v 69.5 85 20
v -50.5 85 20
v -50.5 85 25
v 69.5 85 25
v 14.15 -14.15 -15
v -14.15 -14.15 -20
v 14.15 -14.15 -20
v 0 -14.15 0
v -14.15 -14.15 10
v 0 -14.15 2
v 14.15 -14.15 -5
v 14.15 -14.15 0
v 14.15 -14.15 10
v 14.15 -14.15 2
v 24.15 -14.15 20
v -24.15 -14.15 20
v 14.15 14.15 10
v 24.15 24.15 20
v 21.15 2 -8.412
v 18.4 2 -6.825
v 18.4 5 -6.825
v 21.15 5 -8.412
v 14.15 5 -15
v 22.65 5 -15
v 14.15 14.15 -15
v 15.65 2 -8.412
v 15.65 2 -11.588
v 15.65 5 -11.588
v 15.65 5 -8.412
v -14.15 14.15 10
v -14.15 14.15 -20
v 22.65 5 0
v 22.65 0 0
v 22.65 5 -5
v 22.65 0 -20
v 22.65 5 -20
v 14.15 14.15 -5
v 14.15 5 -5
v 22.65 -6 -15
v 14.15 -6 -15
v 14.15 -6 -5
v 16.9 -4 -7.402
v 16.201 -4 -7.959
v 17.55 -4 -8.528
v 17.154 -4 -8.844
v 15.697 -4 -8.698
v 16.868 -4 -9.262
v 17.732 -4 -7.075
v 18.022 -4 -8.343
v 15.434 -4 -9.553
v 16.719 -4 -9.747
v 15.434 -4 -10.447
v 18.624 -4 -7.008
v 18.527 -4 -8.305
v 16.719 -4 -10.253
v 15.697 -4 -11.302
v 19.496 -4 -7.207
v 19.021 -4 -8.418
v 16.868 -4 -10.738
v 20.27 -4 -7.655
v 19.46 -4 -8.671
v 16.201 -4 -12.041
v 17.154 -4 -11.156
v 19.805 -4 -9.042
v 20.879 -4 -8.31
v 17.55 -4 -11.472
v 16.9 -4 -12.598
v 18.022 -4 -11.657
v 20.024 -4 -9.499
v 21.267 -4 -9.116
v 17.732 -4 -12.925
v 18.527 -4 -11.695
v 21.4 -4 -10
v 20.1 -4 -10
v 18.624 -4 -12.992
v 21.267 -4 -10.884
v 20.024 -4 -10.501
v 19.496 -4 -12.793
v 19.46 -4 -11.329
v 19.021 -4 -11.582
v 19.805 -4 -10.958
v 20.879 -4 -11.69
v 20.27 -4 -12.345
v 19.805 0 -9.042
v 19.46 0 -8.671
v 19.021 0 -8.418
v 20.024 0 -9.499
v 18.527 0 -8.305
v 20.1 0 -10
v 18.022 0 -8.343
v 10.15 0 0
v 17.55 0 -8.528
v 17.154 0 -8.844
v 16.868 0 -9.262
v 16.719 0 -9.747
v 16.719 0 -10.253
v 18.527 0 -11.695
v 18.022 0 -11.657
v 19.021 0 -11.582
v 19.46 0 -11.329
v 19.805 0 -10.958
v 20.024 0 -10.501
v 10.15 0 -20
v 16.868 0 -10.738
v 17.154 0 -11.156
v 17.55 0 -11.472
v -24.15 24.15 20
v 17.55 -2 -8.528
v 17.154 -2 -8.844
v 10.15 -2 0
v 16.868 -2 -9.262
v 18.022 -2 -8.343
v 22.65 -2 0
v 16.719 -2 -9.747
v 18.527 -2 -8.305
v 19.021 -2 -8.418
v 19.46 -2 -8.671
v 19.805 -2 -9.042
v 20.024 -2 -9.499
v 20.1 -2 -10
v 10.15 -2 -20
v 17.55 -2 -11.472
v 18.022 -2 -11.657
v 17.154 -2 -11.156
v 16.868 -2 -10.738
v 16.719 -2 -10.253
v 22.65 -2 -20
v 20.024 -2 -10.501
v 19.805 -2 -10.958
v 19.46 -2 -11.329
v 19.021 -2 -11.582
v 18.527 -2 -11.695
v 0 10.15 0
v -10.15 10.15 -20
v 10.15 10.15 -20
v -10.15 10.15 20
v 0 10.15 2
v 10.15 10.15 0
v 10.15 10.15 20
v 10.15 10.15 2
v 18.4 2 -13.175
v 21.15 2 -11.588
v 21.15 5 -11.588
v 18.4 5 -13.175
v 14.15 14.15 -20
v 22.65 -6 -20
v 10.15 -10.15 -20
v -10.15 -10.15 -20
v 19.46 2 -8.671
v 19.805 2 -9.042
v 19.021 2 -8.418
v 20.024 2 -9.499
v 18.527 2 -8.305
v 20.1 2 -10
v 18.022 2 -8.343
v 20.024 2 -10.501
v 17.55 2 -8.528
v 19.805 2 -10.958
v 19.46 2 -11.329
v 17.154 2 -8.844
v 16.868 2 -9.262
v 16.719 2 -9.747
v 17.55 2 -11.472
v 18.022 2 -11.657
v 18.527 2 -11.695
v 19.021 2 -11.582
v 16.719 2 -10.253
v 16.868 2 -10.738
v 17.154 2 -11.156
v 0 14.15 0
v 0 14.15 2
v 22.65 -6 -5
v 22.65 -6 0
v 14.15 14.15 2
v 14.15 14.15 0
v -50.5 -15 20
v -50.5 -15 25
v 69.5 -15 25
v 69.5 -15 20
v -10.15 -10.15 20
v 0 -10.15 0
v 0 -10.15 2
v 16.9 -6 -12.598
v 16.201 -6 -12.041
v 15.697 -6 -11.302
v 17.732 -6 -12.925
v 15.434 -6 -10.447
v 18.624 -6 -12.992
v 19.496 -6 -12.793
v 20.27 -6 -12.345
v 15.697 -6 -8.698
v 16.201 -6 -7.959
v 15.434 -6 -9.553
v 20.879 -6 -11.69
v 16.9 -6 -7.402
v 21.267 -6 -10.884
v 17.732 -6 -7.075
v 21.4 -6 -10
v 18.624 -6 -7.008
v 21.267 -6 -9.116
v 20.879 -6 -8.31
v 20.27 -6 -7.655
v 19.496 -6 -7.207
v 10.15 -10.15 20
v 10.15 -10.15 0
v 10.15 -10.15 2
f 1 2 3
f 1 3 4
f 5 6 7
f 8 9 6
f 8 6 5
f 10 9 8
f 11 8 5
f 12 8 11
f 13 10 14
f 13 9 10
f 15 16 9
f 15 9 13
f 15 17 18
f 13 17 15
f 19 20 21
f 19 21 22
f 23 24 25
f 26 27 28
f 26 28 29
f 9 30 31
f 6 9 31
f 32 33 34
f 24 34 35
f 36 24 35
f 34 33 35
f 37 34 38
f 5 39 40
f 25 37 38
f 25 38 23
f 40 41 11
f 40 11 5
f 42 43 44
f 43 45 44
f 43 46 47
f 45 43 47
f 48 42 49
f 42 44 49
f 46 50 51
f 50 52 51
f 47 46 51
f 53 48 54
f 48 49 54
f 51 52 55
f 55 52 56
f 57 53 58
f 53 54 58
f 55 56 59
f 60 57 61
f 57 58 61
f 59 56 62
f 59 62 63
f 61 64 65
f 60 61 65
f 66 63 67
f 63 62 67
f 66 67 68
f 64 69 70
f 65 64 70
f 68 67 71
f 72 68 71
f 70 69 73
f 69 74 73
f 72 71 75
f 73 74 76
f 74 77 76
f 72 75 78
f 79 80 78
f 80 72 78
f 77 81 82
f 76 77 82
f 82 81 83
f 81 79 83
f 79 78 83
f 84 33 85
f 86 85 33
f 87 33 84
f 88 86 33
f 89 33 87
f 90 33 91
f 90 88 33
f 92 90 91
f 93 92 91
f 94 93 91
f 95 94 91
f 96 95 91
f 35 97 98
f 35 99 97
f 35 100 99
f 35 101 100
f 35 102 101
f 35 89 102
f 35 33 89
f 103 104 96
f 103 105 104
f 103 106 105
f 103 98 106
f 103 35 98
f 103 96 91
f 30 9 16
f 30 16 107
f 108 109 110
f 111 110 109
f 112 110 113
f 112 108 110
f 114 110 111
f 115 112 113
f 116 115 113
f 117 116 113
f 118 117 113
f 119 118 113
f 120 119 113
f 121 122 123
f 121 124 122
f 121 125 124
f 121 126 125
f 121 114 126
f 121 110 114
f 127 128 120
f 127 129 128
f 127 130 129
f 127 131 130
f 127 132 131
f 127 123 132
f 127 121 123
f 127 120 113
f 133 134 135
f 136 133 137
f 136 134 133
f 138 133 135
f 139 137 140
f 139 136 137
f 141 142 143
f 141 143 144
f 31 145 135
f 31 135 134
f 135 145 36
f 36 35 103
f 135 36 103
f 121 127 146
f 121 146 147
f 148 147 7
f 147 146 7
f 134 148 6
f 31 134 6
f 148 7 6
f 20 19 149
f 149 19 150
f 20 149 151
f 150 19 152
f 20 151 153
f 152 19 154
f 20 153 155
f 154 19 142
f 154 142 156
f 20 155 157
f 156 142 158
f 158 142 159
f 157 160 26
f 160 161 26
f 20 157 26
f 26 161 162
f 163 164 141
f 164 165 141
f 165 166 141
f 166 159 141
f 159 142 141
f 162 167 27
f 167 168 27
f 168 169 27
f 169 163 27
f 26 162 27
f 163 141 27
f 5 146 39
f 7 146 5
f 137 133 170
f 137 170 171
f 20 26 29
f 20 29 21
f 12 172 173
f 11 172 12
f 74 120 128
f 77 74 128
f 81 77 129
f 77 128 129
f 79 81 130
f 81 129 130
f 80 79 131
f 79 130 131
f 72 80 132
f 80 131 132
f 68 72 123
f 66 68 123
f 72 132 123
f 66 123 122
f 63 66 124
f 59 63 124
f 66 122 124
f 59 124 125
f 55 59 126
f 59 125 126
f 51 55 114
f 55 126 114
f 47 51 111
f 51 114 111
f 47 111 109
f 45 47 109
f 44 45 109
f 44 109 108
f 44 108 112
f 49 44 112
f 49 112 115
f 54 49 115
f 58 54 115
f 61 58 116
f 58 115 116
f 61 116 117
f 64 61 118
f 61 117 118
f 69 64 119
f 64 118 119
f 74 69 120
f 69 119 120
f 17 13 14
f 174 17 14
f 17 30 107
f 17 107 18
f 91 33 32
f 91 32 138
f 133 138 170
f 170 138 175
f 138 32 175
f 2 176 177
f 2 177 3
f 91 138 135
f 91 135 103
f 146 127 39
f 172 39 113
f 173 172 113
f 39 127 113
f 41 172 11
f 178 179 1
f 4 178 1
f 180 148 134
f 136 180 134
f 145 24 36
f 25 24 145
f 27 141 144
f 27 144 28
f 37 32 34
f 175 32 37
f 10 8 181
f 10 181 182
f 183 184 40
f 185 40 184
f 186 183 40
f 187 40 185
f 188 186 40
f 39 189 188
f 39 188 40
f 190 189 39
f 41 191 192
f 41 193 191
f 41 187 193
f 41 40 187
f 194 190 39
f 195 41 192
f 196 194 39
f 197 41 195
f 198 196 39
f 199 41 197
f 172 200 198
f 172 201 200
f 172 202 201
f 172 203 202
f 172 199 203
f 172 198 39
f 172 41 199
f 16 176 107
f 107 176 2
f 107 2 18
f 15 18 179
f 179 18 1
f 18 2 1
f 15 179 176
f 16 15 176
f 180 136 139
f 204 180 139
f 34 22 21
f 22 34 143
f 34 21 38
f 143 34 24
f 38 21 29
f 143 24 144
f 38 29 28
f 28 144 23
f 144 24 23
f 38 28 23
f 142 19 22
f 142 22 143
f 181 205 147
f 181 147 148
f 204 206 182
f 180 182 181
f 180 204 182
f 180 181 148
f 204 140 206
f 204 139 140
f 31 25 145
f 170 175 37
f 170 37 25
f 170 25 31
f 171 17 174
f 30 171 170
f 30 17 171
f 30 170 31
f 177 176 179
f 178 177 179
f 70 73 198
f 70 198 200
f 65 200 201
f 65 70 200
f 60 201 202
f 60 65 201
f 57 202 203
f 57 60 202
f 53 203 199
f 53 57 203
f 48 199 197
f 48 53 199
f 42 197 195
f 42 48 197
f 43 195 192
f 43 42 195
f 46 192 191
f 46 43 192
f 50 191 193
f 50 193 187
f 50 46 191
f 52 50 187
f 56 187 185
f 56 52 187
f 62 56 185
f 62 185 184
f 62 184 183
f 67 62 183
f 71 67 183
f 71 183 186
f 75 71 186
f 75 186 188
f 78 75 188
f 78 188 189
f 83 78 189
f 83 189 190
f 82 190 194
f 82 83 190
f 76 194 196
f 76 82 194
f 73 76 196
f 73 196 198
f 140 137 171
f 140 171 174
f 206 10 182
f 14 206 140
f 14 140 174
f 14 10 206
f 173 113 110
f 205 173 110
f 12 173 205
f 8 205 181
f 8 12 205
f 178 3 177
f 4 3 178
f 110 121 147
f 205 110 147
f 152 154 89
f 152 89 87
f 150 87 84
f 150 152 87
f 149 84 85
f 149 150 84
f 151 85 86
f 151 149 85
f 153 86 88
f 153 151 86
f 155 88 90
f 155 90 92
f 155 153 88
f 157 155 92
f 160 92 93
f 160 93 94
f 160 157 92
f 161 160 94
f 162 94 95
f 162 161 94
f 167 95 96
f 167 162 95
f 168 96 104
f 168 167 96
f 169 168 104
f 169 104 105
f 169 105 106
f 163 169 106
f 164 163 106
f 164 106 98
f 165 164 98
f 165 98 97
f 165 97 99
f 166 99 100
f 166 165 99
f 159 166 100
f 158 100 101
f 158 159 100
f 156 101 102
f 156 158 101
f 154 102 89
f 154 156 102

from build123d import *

# Parameters (mm, degrees)
ESQUISSE1_W                = 28.3
ESQUISSE1_H                = 28.3
ESQUISSE1_W_2              = 20.3
ESQUISSE1_H_2              = 20.3
ESQUISSE1_W_3              = 4
ESQUISSE1_H_3              = 2
BOSS_EXTRU_1_DEPTH         = 20
BOSS_EXTRU_7_DEPTH         = 20
ESQUISSE2_W                = 8.5
ESQUISSE2_H                = 20
ESQUISSE2_R                = 1.7
BOSS_EXTRU_2_DEPTH         = 2
ESQUISSE2_3_W              = 8.5
ESQUISSE2_3_H              = 20
BOSS_EXTRU_3_DEPTH         = 3
ESQUISSE3_W                = 8.5
ESQUISSE3_H                = 20
ESQUISSE3_R                = 1.7
BOSS_EXTRU_4_DEPTH         = 2
ESQUISSE5_W                = 8.5
ESQUISSE5_H                = 20
ESQUISSE5_R                = 3
BOSS_EXTRU_5_DEPTH         = 2
BOSS_EXTRU_6_DEPTH         = 20
BOSS_EXTRU_6_DEPTH_BACK    = 20
ESQUISSE6_W                = 28.3
ESQUISSE6_H                = 28.3
ESQUISSE6_W_2              = 15.3
ESQUISSE6_H_2              = 15.3
ENL_V_MAT_EXTRU_1_REACH    = 68.678
ESQUISSE7_W                = 6.5
ESQUISSE7_H                = 2
ENL_V_MAT_EXTRU_2_REACH    = 65.341
ESQUISSE8_W                = 14.15
ESQUISSE8_H                = 2
ESQUISSE9_W                = 8.5
ESQUISSE9_H                = 40
BOSS_EXTRU_8_DEPTH         = 5
ESQUISSE9_4_R              = 1.7
BOSS_EXTRU_9_DEPTH         = 2
BOSS_EXTRU_10_START        = -2
ESQUISSE10_W               = 8.5
ESQUISSE10_H               = 40
ESQUISSE10_R               = 1.7
BOSS_EXTRU_10_DEPTH        = 2
ESQUISSE11_W               = 8.5
ESQUISSE11_H               = 40
ESQUISSE11_R               = 3
BOSS_EXTRU_11_DEPTH        = 2
NERVURE4_REACH             = 68.678
ESQUISSE14_WALL_W          = 147.131281186
ESQUISSE14_WALL_H          = 5
NERVURE10_REACH            = 68.678
ESQUISSE16_WALL_W          = 147.844247416
ESQUISSE16_WALL_H          = 5
R_P_TITION_LIN_AIRE1_COUNT = 3
R_P_TITION_LIN_AIRE1_PITCH = 17.5
NERVURE11_REACH            = 76.685
ESQUISSE17_WALL_W          = 163.85974229
ESQUISSE17_WALL_H          = 5
NERVURE17_REACH            = 58.973
ESQUISSE19_WALL_W          = 127.721749296
ESQUISSE19_WALL_H          = 5
R_P_TITION_LIN_AIRE2_COUNT = 2
R_P_TITION_LIN_AIRE2_PITCH = 15
R_P_TITION_LIN_AIRE3_COUNT = 2
R_P_TITION_LIN_AIRE3_PITCH = 15
ENL_V_MAT_EXTRU_3_REACH    = 52.13
ESQUISSE20_W               = 77.833771897
ESQUISSE20_H               = 63.25162408
ESQUISSE21_W               = 120
ESQUISSE21_H               = 100
BOSS_EXTRU_12_DEPTH        = 5
CHANFREIN1_SIZE            = 10


with BuildPart() as part:
    # Esquisse1 → Boss.-Extru.1 (new body)
    # profile 1 of 2: a face of its own
    with BuildSketch(Plane.XY):
        Rectangle(ESQUISSE1_W, ESQUISSE1_H)
        Rectangle(ESQUISSE1_W_2, ESQUISSE1_H_2, mode=Mode.SUBTRACT)
    # profile 2 of 2: a face of its own
    with BuildSketch(Plane.XY):
        with Locations((12.15, -1)):
            Rectangle(ESQUISSE1_W_3, ESQUISSE1_H_3)
    extrude(amount=BOSS_EXTRU_1_DEPTH)

    # Esquisse1<3> → Boss.-Extru.7 (add)
    with BuildSketch(Plane.XY):
        Polygon((14.15, 14.15), (-14.15, 14.15), (-14.15, -14.15), (14.15, -14.15), (14.15, -2), (10.15, -2), (10.15, -10.15), (-10.15, -10.15), (-10.15, 10.15), (10.15, 10.15), (10.15, 0), (14.15, 0), align=None)
    extrude(amount=-BOSS_EXTRU_7_DEPTH)

    # Esquisse2 → Boss.-Extru.2 (add)
    with BuildSketch(Plane(origin=(0, 2, 0), x_dir=(-1, 0, 0), z_dir=(0, -1, 0))):
        with Locations((-18.4, 10)):
            Rectangle(ESQUISSE2_W, ESQUISSE2_H)
        with Locations(Location((-18.4, 10, 0), (0, 0, 180))):
            Circle(ESQUISSE2_R, mode=Mode.SUBTRACT)
    extrude(amount=BOSS_EXTRU_2_DEPTH)

    # Esquisse2<3> → Boss.-Extru.3 (add)
    with BuildSketch(Plane(origin=(0, 2, 0), x_dir=(-1, 0, 0), z_dir=(0, -1, 0))):
        with Locations((-18.4, 10)):
            Rectangle(ESQUISSE2_3_W, ESQUISSE2_3_H)
        Polygon((-15.65, 11.58771324), (-15.65, 8.41228676), (-18.4, 6.824573519), (-21.15, 8.41228676), (-21.15, 11.58771324), (-18.4, 13.175426481), align=None, mode=Mode.SUBTRACT)
    extrude(amount=-BOSS_EXTRU_3_DEPTH)

    # Esquisse3 → Boss.-Extru.4 (add)
    with BuildSketch(Plane(origin=(0, -2, 0), x_dir=(1, 0, 0), z_dir=(0, 1, 0))):
        with Locations((18.4, 10)):
            Rectangle(ESQUISSE3_W, ESQUISSE3_H)
        with Locations((18.4, 10)):
            Circle(ESQUISSE3_R, mode=Mode.SUBTRACT)
    extrude(amount=-BOSS_EXTRU_4_DEPTH)

    # Esquisse5 → Boss.-Extru.5 (add)
    with BuildSketch(Plane.XZ.offset(4)):
        with Locations((18.4, -10)):
            Rectangle(ESQUISSE5_W, ESQUISSE5_H)
        with Locations((18.4, -10)):
            Circle(ESQUISSE5_R, mode=Mode.SUBTRACT)
    extrude(amount=BOSS_EXTRU_5_DEPTH)

    # Esquisse6 → Boss.-Extru.6 (add, two sides: drawn at the far end of the back side and taken through both)
    with BuildSketch(Plane(origin=(0, 0, 0), x_dir=(-1, 0, 0), z_dir=(0, -1, 0)).offset(-BOSS_EXTRU_6_DEPTH_BACK)):
        with Locations((0, -34.15)):
            Rectangle(ESQUISSE6_W, ESQUISSE6_H)
        with Locations((0, -34.15)):
            Rectangle(ESQUISSE6_W_2, ESQUISSE6_H_2, mode=Mode.SUBTRACT)
    extrude(amount=BOSS_EXTRU_6_DEPTH + BOSS_EXTRU_6_DEPTH_BACK)

    # Esquisse7 → Enlèv. mat.-Extru.1 (cut, up to next)
    with BuildSketch(Plane.XZ.offset(20), mode=Mode.PRIVATE) as enl_v_mat_extru_1_sk1:
        with Locations((10.9, 35.15)):
            Rectangle(ESQUISSE7_W, ESQUISSE7_H)
    enl_v_mat_extru_1_tool1 = extrude(enl_v_mat_extru_1_sk1.sketch, amount=-ENL_V_MAT_EXTRU_1_REACH, mode=Mode.PRIVATE) & part.part
    add(enl_v_mat_extru_1_tool1.solids().sort_by_distance((10.9, -20, 35.15))[0], mode=Mode.SUBTRACT)

    # Esquisse8 → Enlèv. mat.-Extru.2 (cut, up to next)
    with BuildSketch(Plane.XZ.offset(14.15), mode=Mode.PRIVATE) as enl_v_mat_extru_2_sk1:
        with Locations((7.075, 1)):
            Rectangle(ESQUISSE8_W, ESQUISSE8_H)
    enl_v_mat_extru_2_tool1 = extrude(enl_v_mat_extru_2_sk1.sketch, amount=-ENL_V_MAT_EXTRU_2_REACH, mode=Mode.PRIVATE) & part.part
    add(enl_v_mat_extru_2_tool1.solids().sort_by_distance((7.075, -14.15, 1))[0], mode=Mode.SUBTRACT)

    # Esquisse9 → Boss.-Extru.8 (add)
    with BuildSketch(Plane.XY.offset(34.15)):
        with Locations((18.4, 0)):
            Rectangle(ESQUISSE9_W, ESQUISSE9_H)
        Polygon((18.4, 6.824573519), (21.15, 8.41228676), (21.15, 11.58771324), (18.4, 13.175426481), (15.65, 11.58771324), (15.65, 8.41228676), align=None, mode=Mode.SUBTRACT)
        Polygon((18.4, -6.824573519), (21.15, -8.41228676), (21.15, -11.58771324), (18.4, -13.175426481), (15.65, -11.58771324), (15.65, -8.41228676), align=None, mode=Mode.SUBTRACT)
    extrude(amount=-BOSS_EXTRU_8_DEPTH)

    # Esquisse9<4> → Boss.-Extru.9 (add)
    # profile 1 of 2: a face of its own
    with BuildSketch(Plane.XY.offset(34.15)):
        Polygon((15.65, 8.41228676), (18.4, 6.824573519), (21.15, 8.41228676), (21.15, 11.58771324), (18.4, 13.175426481), (15.65, 11.58771324), align=None)
        with Locations((18.4, 10)):
            Circle(ESQUISSE9_4_R, mode=Mode.SUBTRACT)
    # profile 2 of 2: a face of its own
    with BuildSketch(Plane.XY.offset(34.15)):
        Polygon((21.15, -8.41228676), (21.15, -11.58771324), (18.4, -13.175426481), (15.65, -11.58771324), (15.65, -8.41228676), (18.4, -6.824573519), align=None)
        with Locations((18.4, -10)):
            Circle(ESQUISSE9_4_R, mode=Mode.SUBTRACT)
    extrude(amount=-BOSS_EXTRU_9_DEPTH)

    # Esquisse10 → Boss.-Extru.10 (add)
    with BuildSketch(Plane(origin=(0, 0, 36.15), x_dir=(-1, 0, 0), z_dir=(0, 0, -1)).offset(BOSS_EXTRU_10_START)):
        with Locations((-18.4, 0)):
            Rectangle(ESQUISSE10_W, ESQUISSE10_H)
        with Locations(Location((-18.4, -10, 0), (0, 0, 180))):
            Circle(ESQUISSE10_R, mode=Mode.SUBTRACT)
        with Locations(Location((-18.4, 10, 0), (0, 0, 180))):
            Circle(ESQUISSE10_R, mode=Mode.SUBTRACT)
    extrude(amount=BOSS_EXTRU_10_DEPTH)

    # Esquisse11 → Boss.-Extru.11 (add)
    with BuildSketch(Plane.XY.offset(38.15)):
        with Locations((18.4, 0)):
            Rectangle(ESQUISSE11_W, ESQUISSE11_H)
        with Locations((18.4, 10)):
            Circle(ESQUISSE11_R, mode=Mode.SUBTRACT)
        with Locations((18.4, -10)):
            Circle(ESQUISSE11_R, mode=Mode.SUBTRACT)
    extrude(amount=BOSS_EXTRU_11_DEPTH)

    # Esquisse14 wall → Nervure4 (add, up to next)
    with BuildSketch(Plane(origin=(18.4, -20, 44.225), x_dir=(0.721811427095, 0, -0.692089780097), z_dir=(0.692089780097, 0, 0.721811427095)), mode=Mode.PRIVATE) as nervure4_sk1:
        with Locations((0, 2.5)):
            Rectangle(ESQUISSE14_WALL_W, ESQUISSE14_WALL_H)
    nervure4_tool1 = extrude(nervure4_sk1.sketch, amount=-NERVURE4_REACH, mode=Mode.PRIVATE) - part.part
    nervure4 = nervure4_tool1.solids().sort_by_distance((18.4, -20, 44.225))[0]
    add(nervure4)

    # Esquisse16 wall → Nervure10 (add, up to next)
    with BuildSketch(Plane(origin=(18.4, -20, 24.575), x_dir=(-0.680604645507, 0, -0.732650883105), z_dir=(0.732650883105, 0, -0.680604645507)), mode=Mode.PRIVATE) as nervure10_sk1:
        with Locations((0, 2.5)):
            Rectangle(ESQUISSE16_WALL_W, ESQUISSE16_WALL_H)
    nervure10_tool1 = extrude(nervure10_sk1.sketch, amount=-NERVURE10_REACH, mode=Mode.PRIVATE) - part.part
    nervure10 = nervure10_tool1.solids().sort_by_distance((18.4, -20, 24.575))[0]
    add(nervure10)

    # Répétition linéaire1: Nervure4, Nervure10 ×3
    with Locations(*[(0, i * R_P_TITION_LIN_AIRE1_PITCH, 0) for i in range(1, R_P_TITION_LIN_AIRE1_COUNT)]):
        add(nervure4)
        add(nervure10)

    # Esquisse17 wall → Nervure11 (add, up to next)
    with BuildSketch(Plane(origin=(18.4, 9.575, -20), x_dir=(-0.680604645507, 0.732650883105, 0), z_dir=(0.732650883105, 0.680604645507, 0)), mode=Mode.PRIVATE) as nervure11_sk1:
        with Locations((0, 2.5)):
            Rectangle(ESQUISSE17_WALL_W, ESQUISSE17_WALL_H)
    nervure11_tool1 = extrude(nervure11_sk1.sketch, amount=-NERVURE11_REACH, mode=Mode.PRIVATE) - part.part
    nervure11 = nervure11_tool1.solids().sort_by_distance((18.4, 9.575, -20))[0]
    add(nervure11)

    # Esquisse19 wall → Nervure17 (add, up to next)
    with BuildSketch(Plane(origin=(18.4, -10.075, 0), x_dir=(-0.721811427095, -0.692089780097, 0), z_dir=(0.692089780097, -0.721811427095, 0)), mode=Mode.PRIVATE) as nervure17_sk1:
        with Locations((0, 2.5)):
            Rectangle(ESQUISSE19_WALL_W, ESQUISSE19_WALL_H)
    nervure17_tool1 = extrude(nervure17_sk1.sketch, amount=-NERVURE17_REACH, mode=Mode.PRIVATE) - part.part
    nervure17 = nervure17_tool1.solids().sort_by_distance((18.4, -10.075, 0))[0]
    add(nervure17)

    # Répétition linéaire2: Nervure17 ×2
    with Locations(*[(0, 0, -i * R_P_TITION_LIN_AIRE2_PITCH) for i in range(1, R_P_TITION_LIN_AIRE2_COUNT)]):
        add(nervure17)

    # Répétition linéaire3: Nervure11 ×2
    with Locations(*[(0, 0, i * R_P_TITION_LIN_AIRE3_PITCH) for i in range(1, R_P_TITION_LIN_AIRE3_COUNT)]):
        add(nervure11)

    # Esquisse20 → Enlèv. mat.-Extru.3 (cut, up to next)
    with BuildSketch(Plane(origin=(0, 0, 20), x_dir=(-1, 0, 0), z_dir=(0, 0, -1)), mode=Mode.PRIVATE) as enl_v_mat_extru_3_sk1:
        with Locations((6.593135557, -7.228757038)):
            Rectangle(ESQUISSE20_W, ESQUISSE20_H)
    enl_v_mat_extru_3_tool1 = extrude(enl_v_mat_extru_3_sk1.sketch, amount=-ENL_V_MAT_EXTRU_3_REACH, mode=Mode.PRIVATE) & part.part
    add(enl_v_mat_extru_3_tool1.solids().sort_by_distance((-6.593136, -7.228757, 20))[0], mode=Mode.SUBTRACT)

    # Esquisse21 → Boss.-Extru.12 (add)
    with BuildSketch(Plane.XY.offset(20)):
        with Locations((9.5, 35)):
            Rectangle(ESQUISSE21_W, ESQUISSE21_H)
    extrude(amount=BOSS_EXTRU_12_DEPTH)

    # Chanfrein1
    chanfrein1_edges = [part.edges().sort_by_distance(p)[0] for p in [
        (0, 14.15, 20),
        (14.15, 0, 20),
        (-14.15, 0, 20),
    ]]
    chamfer(chanfrein1_edges, length=CHANFREIN1_SIZE)


solid = part.part
